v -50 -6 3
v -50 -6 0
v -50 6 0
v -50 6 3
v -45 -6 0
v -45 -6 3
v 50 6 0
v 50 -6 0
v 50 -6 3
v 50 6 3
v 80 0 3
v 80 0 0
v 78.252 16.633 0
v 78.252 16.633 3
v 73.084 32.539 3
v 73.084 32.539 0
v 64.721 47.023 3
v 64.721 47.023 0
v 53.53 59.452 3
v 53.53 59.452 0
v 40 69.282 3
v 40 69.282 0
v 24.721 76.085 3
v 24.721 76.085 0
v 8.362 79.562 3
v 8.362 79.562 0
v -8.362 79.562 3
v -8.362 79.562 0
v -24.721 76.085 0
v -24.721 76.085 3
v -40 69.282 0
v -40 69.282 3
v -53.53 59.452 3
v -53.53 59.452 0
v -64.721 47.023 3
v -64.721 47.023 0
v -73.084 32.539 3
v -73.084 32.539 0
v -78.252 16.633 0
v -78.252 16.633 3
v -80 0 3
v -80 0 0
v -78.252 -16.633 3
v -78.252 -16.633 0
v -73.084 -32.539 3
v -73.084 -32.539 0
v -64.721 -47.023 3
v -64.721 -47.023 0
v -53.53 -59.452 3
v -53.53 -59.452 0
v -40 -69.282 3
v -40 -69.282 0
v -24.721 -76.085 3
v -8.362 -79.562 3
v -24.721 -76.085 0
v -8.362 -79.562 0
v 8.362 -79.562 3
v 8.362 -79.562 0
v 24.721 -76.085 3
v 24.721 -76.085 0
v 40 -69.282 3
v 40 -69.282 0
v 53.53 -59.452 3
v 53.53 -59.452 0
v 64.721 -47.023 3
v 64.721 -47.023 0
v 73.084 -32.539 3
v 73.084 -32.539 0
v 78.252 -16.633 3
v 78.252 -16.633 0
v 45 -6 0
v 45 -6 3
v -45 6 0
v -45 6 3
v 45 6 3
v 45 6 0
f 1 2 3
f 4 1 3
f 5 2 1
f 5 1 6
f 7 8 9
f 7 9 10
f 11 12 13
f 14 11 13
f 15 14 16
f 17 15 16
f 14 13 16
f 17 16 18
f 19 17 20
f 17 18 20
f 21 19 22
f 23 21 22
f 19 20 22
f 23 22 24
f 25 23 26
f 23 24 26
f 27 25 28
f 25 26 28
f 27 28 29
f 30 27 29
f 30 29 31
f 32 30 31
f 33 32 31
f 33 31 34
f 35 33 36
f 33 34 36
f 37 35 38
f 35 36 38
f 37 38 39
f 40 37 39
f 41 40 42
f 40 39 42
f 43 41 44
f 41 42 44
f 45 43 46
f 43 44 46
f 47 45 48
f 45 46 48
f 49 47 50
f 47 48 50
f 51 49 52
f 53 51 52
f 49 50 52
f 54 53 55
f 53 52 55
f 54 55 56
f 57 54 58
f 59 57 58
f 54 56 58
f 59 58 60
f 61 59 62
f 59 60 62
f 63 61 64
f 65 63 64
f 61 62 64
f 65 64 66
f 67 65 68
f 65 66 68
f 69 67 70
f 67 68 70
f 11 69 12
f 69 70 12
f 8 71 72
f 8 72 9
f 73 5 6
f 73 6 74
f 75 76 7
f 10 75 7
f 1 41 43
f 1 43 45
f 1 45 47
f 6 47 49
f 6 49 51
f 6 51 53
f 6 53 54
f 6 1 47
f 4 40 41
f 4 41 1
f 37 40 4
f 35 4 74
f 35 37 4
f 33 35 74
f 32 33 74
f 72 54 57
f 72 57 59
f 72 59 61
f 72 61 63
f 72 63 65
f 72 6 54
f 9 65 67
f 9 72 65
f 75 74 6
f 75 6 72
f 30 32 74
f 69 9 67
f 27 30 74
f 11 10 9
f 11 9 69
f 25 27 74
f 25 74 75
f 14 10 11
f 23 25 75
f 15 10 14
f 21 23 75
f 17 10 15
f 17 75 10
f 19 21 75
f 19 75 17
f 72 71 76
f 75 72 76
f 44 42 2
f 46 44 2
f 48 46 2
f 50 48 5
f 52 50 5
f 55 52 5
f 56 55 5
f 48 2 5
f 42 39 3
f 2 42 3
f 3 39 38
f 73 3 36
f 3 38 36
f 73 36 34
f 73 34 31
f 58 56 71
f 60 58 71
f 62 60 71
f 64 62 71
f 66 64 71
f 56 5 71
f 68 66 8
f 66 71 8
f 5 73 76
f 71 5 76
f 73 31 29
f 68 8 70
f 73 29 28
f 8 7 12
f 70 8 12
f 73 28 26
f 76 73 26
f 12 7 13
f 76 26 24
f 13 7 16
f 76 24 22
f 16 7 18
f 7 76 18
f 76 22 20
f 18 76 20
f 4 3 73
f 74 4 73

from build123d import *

# Parameters (mm, degrees)
SKETCH_R  = 80
SKETCH_W  = 5
SKETCH_H  = 12
PAD_DEPTH = 3


with BuildPart() as part:
    # Sketch → Pad (new body)
    with BuildSketch(Plane.XY):
        Circle(SKETCH_R)
        with Locations((-47.5, 0)):
            Rectangle(SKETCH_W, SKETCH_H, mode=Mode.SUBTRACT)
        with Locations((47.5, 0)):
            Rectangle(SKETCH_W, SKETCH_H, mode=Mode.SUBTRACT)
    extrude(amount=PAD_DEPTH)


solid = part.part
